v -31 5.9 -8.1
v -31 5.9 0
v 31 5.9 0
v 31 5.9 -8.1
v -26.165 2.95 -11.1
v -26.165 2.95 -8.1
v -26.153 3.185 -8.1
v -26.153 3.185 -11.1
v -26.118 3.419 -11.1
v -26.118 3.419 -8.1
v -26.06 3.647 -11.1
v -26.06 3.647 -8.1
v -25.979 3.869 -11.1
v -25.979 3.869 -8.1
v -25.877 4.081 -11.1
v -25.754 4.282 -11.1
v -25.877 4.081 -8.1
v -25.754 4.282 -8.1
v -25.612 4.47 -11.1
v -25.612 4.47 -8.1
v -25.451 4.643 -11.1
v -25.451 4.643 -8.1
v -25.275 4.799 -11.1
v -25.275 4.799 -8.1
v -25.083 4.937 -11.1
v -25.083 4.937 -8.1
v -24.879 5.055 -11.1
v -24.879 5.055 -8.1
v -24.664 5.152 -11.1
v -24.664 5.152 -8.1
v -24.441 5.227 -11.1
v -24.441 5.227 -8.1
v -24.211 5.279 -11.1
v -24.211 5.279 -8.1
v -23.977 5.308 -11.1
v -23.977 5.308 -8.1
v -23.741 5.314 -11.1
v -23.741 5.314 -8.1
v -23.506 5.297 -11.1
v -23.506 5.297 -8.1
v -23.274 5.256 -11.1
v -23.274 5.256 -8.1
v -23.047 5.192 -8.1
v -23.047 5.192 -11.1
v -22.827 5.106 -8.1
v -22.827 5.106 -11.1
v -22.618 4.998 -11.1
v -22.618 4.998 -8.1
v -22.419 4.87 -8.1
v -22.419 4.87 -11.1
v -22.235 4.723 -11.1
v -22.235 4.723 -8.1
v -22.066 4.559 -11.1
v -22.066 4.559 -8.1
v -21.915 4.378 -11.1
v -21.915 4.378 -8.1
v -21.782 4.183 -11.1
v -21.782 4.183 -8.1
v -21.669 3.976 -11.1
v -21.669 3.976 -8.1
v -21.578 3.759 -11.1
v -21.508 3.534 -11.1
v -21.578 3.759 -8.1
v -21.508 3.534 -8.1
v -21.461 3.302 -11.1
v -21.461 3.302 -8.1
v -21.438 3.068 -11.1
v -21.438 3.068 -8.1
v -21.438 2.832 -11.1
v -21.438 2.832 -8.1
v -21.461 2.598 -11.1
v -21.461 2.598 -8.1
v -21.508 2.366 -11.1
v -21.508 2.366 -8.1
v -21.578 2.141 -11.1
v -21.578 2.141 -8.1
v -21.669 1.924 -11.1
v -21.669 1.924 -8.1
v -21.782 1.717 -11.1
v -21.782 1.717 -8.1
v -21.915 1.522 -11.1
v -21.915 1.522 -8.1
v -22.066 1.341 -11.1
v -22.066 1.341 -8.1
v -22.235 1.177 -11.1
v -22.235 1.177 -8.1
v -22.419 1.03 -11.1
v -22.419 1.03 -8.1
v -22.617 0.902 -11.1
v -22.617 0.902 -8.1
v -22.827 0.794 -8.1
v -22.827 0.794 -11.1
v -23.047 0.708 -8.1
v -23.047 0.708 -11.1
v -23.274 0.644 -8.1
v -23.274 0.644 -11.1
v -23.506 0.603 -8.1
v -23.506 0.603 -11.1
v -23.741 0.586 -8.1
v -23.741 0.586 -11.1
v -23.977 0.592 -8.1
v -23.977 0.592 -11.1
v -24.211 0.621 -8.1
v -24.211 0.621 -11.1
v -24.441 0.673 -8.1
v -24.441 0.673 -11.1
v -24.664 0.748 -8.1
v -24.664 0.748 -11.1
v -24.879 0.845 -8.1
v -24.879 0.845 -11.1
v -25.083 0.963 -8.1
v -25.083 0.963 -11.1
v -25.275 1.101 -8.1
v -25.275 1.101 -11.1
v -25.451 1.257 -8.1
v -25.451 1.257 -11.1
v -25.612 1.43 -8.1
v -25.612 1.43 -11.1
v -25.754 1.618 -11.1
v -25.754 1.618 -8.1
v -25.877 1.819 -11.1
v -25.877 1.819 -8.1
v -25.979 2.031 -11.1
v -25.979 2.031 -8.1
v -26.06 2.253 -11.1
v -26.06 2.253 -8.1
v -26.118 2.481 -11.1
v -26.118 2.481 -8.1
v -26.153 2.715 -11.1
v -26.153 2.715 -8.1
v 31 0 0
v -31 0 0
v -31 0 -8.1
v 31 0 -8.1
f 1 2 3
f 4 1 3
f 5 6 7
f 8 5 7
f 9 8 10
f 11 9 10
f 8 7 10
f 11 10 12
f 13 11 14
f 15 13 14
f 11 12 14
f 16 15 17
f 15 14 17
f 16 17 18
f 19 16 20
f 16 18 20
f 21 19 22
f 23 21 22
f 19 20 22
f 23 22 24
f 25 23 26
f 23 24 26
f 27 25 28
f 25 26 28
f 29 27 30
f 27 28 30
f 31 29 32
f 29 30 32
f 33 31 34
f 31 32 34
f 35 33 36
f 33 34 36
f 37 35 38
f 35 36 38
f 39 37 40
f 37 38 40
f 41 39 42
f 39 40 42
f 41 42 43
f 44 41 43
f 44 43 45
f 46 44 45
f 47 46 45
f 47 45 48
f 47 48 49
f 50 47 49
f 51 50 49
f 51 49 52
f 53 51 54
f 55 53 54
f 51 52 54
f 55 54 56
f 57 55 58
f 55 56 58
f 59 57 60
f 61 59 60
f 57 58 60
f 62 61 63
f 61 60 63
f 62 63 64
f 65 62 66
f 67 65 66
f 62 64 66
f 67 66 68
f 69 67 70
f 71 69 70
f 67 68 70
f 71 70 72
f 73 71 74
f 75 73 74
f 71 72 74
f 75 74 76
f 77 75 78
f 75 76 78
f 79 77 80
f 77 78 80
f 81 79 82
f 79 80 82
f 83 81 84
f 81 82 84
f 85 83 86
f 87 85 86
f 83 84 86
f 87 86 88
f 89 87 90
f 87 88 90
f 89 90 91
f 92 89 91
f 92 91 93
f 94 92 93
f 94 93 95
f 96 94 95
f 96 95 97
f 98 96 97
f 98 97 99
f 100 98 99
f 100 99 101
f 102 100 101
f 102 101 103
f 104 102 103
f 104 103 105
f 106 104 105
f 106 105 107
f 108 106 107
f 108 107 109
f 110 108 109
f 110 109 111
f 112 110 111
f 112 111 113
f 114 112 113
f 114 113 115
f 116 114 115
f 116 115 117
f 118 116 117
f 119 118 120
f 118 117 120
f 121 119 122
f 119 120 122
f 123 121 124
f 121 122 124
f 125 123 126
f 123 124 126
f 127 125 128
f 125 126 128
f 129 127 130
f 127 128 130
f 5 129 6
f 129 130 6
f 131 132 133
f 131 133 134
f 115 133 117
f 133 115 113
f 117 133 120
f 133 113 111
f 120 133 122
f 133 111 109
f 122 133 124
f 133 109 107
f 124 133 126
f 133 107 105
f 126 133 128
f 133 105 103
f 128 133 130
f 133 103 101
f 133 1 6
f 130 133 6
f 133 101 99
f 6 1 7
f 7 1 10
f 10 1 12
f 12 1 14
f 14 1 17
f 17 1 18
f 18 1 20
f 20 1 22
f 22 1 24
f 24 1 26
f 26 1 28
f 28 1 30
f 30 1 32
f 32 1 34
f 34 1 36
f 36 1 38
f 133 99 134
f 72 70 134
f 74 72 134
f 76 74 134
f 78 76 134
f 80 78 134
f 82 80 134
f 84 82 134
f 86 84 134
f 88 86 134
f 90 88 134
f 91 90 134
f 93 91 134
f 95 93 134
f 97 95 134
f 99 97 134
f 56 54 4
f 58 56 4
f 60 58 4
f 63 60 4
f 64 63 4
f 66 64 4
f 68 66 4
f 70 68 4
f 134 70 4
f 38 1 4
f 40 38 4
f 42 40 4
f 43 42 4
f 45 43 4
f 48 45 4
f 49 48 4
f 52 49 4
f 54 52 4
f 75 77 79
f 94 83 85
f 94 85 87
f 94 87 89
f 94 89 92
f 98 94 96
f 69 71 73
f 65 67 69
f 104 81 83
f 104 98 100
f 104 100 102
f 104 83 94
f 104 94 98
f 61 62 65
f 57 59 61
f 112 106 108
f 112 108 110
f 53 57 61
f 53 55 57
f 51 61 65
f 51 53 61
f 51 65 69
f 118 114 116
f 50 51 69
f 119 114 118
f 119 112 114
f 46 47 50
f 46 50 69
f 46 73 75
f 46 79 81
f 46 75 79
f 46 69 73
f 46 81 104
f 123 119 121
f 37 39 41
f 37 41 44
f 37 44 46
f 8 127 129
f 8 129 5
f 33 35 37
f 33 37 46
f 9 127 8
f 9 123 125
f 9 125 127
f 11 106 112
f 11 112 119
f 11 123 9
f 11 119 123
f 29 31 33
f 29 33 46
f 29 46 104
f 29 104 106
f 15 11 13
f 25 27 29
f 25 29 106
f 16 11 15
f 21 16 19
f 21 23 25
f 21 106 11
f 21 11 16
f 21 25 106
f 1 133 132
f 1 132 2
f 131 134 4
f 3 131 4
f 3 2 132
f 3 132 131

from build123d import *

# Parameters (mm, degrees)
SKETCH1_W           = 62
SKETCH1_H           = 5.9
BOSS_EXTRUDE1_DEPTH = 8.1
SKETCH4_R           = 2.365
BOSS_EXTRUDE2_DEPTH = 3


with BuildPart() as part:
    # Sketch1 → Boss-Extrude1 (new body)
    with BuildSketch(Plane.XY):
        with Locations((0, 2.95)):
            Rectangle(SKETCH1_W, SKETCH1_H)
    extrude(amount=-BOSS_EXTRUDE1_DEPTH)

    # Sketch4 → Boss-Extrude2 (add)
    with BuildSketch(Plane(origin=(0, 0, -8.1), x_dir=(-1, 0, 0), z_dir=(0, 0, -1))):
        with Locations((23.8, 2.95)):
            Circle(SKETCH4_R)
    extrude(amount=BOSS_EXTRUDE2_DEPTH)


solid = part.part
